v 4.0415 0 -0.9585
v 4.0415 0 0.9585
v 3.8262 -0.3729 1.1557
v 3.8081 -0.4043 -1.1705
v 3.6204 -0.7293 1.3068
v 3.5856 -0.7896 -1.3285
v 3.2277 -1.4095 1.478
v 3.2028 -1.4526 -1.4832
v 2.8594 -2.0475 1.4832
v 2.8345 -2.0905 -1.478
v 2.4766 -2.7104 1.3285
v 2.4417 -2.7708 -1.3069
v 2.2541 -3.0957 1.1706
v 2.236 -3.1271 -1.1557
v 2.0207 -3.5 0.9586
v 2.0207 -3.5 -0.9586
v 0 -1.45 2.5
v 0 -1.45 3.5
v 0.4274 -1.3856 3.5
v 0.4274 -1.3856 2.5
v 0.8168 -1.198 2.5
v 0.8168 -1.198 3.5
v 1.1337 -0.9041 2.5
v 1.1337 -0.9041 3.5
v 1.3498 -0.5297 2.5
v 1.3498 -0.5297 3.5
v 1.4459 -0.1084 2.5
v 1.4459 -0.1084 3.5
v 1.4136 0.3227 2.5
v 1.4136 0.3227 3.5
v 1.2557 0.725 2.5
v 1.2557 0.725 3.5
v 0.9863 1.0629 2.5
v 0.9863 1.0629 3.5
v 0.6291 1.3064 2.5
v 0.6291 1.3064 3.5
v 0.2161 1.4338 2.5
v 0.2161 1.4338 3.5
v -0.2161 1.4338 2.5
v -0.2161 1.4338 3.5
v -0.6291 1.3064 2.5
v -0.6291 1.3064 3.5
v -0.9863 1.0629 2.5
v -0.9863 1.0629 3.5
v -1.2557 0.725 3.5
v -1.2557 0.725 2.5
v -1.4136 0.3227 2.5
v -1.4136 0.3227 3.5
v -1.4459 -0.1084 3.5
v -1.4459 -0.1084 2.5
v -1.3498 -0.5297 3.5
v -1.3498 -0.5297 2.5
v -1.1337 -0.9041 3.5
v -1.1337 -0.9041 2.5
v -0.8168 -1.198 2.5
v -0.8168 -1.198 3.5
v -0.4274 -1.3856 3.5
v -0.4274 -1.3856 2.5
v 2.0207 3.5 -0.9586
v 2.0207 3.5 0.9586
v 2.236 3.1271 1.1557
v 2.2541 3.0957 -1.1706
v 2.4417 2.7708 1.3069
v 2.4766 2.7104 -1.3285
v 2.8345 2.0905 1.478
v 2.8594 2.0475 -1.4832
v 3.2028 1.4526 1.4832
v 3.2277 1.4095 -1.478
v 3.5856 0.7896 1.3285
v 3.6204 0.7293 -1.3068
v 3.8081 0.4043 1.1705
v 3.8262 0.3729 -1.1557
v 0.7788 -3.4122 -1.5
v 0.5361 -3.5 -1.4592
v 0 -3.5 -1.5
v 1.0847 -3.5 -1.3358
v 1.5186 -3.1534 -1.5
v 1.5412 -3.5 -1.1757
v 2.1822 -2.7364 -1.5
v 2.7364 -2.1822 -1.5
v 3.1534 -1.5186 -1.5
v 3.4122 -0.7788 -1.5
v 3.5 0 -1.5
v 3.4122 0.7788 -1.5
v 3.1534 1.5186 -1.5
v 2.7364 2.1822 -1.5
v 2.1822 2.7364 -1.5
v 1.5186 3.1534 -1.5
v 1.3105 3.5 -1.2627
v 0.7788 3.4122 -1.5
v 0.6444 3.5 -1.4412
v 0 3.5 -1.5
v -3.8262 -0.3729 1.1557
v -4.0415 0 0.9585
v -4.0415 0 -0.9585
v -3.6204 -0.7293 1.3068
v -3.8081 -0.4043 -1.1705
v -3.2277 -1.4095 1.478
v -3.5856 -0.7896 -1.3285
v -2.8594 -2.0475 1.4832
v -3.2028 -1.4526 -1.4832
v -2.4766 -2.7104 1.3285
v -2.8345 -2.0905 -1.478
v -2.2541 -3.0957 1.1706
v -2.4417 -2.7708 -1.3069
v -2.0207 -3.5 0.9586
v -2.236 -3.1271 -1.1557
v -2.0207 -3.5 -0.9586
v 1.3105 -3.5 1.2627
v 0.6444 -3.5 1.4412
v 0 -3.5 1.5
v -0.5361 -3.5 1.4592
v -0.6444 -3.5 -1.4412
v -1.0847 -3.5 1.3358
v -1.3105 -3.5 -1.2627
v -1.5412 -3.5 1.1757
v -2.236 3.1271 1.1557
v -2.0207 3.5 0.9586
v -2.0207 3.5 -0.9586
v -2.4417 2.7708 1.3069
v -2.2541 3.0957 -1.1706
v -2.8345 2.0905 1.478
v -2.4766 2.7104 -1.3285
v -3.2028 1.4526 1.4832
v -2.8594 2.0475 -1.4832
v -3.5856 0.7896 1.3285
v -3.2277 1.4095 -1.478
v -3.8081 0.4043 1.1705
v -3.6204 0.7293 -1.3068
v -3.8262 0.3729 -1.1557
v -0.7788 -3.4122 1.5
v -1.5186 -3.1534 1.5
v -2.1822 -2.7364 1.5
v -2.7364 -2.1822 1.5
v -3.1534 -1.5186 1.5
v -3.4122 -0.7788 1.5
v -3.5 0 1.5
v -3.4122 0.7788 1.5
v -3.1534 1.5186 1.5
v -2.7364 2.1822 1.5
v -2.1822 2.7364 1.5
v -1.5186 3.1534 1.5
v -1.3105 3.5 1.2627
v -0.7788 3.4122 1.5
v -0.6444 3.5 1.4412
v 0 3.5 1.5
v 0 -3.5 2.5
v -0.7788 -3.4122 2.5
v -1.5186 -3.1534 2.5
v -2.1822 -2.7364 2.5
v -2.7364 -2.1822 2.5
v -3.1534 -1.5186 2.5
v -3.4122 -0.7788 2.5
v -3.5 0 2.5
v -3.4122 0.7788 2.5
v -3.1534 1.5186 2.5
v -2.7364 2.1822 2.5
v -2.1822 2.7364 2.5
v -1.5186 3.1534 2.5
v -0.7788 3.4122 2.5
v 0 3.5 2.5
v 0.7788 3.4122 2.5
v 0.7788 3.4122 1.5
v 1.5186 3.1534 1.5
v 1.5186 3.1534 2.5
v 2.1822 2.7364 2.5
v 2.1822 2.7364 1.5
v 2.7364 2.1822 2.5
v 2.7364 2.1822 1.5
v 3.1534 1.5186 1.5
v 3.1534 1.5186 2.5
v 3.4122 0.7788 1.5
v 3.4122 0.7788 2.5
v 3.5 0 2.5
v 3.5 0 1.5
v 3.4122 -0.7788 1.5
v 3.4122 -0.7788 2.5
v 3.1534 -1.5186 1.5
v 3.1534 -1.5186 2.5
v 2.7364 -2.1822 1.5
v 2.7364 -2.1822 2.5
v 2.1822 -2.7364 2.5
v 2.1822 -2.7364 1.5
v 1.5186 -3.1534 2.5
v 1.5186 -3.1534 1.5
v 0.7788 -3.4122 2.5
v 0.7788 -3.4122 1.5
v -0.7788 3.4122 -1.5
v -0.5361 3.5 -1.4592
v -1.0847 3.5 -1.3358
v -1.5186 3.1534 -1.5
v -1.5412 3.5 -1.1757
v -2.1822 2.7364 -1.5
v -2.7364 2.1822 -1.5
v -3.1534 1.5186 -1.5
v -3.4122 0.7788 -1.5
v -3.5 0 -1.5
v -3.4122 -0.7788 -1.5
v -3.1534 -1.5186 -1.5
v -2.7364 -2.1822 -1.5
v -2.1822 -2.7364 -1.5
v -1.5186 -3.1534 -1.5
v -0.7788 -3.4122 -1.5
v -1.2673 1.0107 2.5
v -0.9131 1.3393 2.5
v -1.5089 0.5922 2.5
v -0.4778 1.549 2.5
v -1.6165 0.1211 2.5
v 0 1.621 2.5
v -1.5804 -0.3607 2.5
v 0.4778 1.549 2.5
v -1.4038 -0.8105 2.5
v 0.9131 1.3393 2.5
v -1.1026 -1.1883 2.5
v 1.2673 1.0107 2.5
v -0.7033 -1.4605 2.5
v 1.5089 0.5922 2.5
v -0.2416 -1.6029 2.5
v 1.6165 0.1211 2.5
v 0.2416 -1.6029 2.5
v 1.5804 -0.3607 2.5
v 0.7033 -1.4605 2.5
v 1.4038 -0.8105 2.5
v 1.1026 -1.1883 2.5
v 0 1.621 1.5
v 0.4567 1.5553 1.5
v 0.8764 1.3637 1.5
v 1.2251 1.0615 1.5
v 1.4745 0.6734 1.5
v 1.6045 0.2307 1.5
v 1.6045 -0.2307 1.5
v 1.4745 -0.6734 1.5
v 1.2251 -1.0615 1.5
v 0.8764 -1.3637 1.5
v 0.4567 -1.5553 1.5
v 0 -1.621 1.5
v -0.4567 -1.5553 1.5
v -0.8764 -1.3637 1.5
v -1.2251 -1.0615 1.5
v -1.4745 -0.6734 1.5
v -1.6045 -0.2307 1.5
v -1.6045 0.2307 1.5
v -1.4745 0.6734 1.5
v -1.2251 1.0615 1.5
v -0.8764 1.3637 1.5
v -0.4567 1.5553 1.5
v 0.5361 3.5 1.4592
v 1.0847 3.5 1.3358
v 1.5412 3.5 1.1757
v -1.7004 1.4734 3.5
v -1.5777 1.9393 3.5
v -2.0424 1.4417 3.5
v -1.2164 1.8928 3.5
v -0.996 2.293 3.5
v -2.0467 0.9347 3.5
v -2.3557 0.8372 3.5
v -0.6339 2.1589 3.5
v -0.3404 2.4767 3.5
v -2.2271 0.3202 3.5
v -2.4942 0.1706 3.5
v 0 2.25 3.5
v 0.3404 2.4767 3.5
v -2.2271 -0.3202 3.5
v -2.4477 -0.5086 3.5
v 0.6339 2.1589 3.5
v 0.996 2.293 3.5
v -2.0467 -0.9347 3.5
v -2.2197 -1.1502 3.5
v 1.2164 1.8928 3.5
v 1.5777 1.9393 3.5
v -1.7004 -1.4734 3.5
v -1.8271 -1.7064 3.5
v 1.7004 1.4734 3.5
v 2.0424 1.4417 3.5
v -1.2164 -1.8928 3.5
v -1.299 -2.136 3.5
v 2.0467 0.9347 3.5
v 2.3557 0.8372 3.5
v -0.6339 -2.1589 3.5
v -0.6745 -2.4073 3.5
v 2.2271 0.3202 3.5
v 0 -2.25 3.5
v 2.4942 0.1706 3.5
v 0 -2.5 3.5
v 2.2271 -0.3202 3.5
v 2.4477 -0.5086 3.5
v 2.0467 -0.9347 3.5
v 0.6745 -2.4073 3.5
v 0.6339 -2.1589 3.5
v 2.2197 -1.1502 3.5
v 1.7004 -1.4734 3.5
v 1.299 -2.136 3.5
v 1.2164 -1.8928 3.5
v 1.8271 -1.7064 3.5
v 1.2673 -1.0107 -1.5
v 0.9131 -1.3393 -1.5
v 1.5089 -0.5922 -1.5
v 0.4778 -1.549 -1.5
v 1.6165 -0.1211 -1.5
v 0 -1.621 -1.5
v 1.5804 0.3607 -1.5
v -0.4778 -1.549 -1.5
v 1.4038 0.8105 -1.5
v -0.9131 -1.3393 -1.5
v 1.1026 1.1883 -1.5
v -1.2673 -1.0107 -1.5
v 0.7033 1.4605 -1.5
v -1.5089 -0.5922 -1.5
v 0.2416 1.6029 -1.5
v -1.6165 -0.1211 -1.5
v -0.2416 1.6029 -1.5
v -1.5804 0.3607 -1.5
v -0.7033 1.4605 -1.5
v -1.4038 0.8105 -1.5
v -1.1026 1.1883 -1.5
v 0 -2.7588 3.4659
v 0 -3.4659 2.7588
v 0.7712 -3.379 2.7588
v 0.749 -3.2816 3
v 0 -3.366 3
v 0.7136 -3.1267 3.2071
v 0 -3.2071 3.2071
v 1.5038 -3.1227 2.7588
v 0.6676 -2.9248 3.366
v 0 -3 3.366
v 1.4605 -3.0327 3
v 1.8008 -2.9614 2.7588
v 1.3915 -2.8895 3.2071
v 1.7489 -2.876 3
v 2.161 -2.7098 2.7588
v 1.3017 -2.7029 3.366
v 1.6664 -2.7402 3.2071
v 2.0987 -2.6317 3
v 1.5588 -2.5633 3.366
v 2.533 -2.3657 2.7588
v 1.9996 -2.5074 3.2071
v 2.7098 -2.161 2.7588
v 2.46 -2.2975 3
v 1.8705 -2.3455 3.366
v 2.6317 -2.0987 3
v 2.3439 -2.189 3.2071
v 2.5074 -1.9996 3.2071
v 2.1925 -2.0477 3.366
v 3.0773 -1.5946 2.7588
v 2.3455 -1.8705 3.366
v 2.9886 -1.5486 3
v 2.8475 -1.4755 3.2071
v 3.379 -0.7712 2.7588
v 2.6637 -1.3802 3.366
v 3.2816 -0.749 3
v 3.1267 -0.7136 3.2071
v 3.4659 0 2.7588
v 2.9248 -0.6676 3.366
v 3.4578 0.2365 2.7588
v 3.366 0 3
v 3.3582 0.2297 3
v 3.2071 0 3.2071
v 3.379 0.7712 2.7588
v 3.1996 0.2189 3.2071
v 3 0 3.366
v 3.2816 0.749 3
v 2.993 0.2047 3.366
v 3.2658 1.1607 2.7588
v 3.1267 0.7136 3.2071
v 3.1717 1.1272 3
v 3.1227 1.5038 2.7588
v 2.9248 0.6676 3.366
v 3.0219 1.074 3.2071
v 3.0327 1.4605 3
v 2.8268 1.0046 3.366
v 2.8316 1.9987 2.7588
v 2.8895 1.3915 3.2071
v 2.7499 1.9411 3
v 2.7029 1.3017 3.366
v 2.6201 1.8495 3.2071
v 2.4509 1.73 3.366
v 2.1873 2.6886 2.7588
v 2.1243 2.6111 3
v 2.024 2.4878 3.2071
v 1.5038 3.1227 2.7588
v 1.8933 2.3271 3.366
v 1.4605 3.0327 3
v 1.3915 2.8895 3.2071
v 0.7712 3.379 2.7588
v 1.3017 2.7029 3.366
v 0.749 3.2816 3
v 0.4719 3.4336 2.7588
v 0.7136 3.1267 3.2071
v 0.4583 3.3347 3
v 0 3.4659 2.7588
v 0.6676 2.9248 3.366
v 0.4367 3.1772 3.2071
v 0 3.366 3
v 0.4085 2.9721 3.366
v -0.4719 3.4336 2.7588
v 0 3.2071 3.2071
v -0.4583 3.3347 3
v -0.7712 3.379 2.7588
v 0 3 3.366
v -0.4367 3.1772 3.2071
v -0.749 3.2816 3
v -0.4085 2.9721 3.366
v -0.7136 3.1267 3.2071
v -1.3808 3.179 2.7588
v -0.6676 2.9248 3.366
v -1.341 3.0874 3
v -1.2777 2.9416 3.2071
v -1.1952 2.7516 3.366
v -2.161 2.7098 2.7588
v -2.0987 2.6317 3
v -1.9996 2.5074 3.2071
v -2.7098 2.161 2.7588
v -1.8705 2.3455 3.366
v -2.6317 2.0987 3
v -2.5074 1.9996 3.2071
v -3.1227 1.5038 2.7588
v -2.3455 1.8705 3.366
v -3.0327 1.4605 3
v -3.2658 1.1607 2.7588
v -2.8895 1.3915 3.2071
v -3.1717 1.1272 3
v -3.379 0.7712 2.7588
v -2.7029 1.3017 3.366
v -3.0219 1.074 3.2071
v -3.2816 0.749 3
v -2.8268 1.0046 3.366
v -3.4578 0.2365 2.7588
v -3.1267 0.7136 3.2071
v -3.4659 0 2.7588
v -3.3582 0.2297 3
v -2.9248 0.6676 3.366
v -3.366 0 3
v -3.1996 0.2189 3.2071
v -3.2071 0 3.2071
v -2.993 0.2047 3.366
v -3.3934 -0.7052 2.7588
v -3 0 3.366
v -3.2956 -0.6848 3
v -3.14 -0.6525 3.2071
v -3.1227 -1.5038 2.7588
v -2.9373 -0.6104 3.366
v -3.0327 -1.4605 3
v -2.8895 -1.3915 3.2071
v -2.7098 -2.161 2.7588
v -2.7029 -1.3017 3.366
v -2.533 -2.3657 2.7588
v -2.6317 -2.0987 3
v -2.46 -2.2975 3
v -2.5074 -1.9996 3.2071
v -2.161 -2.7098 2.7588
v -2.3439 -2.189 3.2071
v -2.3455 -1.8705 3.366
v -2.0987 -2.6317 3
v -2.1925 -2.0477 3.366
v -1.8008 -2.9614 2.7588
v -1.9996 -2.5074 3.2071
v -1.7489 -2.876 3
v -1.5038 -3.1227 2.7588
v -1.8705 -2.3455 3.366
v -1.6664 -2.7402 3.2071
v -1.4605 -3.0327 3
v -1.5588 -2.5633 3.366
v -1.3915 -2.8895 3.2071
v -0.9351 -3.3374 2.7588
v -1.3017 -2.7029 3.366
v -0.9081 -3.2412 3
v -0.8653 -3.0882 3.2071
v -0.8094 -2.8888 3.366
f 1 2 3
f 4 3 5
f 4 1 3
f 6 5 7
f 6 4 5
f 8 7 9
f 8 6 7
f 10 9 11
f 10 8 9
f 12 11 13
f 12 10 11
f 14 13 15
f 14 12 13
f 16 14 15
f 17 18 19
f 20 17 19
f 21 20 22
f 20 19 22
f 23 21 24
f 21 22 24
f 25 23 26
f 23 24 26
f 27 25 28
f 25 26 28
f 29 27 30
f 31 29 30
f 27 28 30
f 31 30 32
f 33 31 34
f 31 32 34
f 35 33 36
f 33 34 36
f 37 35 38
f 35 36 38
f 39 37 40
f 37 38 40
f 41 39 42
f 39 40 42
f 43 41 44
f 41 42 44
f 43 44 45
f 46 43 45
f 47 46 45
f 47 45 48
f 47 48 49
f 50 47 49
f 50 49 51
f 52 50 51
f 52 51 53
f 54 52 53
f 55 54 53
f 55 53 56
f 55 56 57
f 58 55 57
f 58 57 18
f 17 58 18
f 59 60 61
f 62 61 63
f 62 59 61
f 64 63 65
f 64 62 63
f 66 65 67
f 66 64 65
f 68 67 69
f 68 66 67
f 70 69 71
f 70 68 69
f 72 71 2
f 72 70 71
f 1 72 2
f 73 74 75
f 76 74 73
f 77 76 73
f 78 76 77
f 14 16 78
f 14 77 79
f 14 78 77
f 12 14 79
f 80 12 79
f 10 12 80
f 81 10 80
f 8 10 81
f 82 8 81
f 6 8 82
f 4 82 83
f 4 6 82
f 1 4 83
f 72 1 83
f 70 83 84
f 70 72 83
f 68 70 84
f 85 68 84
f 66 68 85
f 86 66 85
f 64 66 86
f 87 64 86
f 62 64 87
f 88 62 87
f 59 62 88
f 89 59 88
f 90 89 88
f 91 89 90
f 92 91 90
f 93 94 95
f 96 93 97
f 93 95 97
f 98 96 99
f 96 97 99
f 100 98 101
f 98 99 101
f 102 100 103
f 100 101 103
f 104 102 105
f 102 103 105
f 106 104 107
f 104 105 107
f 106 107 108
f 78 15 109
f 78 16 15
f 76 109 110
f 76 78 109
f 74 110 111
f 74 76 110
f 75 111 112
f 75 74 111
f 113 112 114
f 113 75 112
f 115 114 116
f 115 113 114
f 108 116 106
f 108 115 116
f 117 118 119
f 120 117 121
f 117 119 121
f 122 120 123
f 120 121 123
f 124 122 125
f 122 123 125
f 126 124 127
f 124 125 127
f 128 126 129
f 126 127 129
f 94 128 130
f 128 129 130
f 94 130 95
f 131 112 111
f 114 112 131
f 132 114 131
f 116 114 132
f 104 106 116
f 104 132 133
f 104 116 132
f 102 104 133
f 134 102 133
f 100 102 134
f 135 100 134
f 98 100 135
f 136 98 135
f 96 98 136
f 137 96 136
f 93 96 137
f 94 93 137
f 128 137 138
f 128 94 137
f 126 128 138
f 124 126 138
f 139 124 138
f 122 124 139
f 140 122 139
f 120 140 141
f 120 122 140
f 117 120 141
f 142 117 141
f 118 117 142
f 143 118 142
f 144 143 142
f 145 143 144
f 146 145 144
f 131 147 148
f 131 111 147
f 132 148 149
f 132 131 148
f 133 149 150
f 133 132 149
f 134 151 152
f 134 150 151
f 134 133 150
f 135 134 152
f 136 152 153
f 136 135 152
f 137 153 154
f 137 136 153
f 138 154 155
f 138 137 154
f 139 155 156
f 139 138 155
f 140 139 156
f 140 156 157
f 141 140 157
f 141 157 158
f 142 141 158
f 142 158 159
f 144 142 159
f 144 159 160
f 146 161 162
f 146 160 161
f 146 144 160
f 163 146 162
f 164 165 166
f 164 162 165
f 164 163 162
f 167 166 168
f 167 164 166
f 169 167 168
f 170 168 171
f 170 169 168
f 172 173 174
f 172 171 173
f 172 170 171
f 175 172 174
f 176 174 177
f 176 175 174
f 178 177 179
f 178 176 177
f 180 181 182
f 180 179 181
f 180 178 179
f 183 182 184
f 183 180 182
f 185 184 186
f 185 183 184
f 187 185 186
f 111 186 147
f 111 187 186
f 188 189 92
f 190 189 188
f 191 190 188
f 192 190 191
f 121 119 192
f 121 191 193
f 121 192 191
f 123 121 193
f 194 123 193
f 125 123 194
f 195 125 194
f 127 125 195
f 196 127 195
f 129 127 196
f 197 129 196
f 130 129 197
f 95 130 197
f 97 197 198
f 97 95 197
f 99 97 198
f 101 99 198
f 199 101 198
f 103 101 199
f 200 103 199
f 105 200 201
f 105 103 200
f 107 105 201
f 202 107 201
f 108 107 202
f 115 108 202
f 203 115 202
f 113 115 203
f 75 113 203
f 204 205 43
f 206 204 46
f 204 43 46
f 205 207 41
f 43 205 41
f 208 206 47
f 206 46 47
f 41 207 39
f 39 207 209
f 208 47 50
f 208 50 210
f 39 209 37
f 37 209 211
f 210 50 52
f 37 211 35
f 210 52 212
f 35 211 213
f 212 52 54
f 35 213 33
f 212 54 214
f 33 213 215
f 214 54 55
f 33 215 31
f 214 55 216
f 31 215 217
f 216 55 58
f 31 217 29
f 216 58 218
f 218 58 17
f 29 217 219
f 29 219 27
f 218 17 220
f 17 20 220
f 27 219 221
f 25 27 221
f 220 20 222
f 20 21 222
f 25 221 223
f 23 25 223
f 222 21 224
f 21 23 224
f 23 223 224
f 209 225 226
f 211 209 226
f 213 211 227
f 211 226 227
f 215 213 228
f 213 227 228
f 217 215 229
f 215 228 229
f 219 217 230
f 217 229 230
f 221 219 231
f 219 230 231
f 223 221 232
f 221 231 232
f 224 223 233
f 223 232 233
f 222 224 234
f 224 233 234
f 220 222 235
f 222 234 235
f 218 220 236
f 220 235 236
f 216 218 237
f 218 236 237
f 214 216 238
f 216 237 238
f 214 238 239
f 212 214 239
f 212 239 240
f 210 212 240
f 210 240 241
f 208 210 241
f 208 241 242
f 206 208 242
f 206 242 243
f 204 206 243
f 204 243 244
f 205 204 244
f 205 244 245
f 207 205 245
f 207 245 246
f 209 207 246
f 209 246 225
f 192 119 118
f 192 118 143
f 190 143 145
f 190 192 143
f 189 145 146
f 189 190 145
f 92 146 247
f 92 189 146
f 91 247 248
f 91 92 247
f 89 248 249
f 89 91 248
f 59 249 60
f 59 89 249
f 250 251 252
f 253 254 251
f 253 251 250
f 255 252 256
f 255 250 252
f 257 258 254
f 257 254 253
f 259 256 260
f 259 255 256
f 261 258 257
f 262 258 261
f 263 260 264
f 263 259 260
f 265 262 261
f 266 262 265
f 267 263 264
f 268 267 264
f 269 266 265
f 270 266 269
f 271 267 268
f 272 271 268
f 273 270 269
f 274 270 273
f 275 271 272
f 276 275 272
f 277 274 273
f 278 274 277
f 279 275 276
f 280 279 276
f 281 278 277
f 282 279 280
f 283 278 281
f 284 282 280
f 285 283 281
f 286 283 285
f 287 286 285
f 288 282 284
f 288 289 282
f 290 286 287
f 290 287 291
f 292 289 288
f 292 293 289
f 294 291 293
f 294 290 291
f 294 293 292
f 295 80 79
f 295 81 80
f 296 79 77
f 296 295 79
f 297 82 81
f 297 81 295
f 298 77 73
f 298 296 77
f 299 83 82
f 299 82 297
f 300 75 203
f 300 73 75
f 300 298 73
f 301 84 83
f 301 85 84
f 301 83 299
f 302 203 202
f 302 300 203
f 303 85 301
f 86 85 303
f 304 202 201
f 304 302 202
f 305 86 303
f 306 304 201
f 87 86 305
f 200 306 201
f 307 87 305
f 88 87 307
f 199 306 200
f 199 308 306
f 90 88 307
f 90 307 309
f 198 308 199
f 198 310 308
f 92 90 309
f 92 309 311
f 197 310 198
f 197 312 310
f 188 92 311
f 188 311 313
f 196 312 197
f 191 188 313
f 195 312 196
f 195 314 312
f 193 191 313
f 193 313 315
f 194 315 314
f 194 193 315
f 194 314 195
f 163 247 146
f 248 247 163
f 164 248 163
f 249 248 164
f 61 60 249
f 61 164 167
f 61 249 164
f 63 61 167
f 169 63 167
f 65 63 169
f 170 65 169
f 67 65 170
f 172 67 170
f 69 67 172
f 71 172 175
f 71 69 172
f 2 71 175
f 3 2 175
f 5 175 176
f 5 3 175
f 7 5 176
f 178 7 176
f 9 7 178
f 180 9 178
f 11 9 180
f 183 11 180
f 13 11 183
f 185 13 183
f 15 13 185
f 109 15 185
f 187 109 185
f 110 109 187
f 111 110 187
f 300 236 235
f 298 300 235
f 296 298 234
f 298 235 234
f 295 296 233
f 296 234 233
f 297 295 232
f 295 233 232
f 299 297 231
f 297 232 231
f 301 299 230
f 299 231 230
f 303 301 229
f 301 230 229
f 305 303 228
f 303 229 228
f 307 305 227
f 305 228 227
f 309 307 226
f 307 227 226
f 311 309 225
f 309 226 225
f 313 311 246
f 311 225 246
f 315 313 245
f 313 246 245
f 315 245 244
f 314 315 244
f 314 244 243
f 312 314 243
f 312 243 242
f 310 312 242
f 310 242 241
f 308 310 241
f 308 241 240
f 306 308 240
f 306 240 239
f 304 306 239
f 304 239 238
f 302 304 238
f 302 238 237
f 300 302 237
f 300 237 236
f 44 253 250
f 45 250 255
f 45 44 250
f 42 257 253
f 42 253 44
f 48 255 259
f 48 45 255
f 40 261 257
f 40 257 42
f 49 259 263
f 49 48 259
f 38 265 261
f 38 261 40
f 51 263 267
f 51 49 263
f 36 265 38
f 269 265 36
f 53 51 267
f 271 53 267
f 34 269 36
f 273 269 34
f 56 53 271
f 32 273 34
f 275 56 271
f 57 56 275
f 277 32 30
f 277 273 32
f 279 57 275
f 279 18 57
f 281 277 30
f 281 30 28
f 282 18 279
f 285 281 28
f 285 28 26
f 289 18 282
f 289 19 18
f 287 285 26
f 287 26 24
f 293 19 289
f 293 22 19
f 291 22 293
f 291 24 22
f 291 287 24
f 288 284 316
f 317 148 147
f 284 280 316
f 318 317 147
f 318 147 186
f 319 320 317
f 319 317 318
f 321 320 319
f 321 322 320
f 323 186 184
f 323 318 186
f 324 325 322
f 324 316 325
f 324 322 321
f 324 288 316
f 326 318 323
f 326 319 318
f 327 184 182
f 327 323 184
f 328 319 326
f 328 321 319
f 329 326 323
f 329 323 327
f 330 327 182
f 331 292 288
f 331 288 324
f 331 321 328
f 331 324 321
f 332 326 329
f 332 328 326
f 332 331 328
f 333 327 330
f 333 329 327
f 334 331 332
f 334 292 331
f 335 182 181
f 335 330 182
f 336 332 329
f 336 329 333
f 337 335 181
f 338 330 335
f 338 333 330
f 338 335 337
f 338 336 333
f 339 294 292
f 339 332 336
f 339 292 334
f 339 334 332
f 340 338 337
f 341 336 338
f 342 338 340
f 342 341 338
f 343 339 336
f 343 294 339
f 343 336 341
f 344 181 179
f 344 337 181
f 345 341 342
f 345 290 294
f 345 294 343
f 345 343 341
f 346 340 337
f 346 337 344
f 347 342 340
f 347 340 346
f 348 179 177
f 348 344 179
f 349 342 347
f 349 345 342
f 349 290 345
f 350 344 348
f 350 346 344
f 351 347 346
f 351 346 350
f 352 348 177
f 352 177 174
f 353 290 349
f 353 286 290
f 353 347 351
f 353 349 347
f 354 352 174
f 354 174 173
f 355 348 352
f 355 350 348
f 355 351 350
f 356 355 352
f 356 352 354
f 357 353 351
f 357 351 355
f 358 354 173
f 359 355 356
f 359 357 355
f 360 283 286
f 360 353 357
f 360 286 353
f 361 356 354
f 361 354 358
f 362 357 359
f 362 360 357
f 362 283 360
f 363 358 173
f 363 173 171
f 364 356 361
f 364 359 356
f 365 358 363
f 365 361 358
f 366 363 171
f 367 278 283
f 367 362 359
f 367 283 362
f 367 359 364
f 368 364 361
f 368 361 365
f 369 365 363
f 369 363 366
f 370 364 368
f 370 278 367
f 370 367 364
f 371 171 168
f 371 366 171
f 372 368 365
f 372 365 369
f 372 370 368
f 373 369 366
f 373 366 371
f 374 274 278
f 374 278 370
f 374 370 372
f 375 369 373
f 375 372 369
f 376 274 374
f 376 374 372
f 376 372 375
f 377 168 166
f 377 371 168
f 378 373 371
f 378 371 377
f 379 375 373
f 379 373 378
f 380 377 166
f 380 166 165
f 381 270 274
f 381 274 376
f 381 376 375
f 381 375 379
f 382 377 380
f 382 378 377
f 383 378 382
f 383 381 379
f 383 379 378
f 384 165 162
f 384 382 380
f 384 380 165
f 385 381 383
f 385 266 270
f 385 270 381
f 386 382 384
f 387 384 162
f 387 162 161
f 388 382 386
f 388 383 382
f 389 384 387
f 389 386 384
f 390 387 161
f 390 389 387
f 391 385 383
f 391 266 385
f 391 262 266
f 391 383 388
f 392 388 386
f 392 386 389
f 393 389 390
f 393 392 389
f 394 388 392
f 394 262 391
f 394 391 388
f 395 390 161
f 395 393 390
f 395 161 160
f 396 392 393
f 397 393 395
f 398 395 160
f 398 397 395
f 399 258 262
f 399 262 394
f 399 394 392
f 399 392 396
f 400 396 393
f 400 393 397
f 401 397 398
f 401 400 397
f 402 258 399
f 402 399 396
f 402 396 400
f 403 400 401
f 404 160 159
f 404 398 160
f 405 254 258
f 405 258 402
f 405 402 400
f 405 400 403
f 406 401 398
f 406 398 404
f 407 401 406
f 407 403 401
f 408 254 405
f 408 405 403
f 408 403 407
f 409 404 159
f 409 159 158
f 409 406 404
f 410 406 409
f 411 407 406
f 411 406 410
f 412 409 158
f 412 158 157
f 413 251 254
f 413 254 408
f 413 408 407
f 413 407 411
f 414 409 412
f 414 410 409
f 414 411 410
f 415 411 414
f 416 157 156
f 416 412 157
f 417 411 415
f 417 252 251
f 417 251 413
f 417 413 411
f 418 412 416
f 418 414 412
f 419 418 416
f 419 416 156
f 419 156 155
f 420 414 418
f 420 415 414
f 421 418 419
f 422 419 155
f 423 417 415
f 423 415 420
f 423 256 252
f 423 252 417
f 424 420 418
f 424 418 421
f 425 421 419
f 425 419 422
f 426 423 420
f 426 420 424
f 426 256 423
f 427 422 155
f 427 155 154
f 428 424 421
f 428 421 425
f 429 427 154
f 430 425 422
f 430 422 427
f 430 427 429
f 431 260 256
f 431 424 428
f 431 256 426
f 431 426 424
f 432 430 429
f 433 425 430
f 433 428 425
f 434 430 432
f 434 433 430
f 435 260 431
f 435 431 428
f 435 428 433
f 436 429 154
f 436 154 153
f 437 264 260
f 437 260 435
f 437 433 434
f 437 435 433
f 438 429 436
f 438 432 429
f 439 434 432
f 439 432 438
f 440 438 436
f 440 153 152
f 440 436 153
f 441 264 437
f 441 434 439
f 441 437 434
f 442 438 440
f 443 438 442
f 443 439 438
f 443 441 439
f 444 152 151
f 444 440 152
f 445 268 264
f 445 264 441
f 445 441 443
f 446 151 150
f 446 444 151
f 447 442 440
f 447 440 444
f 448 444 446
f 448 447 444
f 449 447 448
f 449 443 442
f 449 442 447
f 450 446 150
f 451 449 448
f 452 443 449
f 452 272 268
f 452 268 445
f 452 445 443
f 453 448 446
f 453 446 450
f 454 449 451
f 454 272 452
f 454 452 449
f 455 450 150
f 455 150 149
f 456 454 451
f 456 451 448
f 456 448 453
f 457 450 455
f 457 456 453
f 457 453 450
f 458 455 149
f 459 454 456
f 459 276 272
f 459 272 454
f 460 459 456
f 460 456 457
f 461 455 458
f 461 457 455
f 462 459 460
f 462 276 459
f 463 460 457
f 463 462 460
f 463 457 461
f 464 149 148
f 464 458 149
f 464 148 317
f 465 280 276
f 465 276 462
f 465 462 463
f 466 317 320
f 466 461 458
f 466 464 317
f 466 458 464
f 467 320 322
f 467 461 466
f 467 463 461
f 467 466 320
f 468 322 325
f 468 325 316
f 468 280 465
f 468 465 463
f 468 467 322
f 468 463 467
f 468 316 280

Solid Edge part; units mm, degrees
sketch "Sketch1" plane through (0, 0, 0) normal (0, 0, 1) x (1, 0, 0)
  line L0 (2.0207, -3.5) -> (-2.0207, -3.5)
  line L1 (-4.0415, 0) -> (-2.0207, -3.5)
  line L2 (-2.0207, 3.5) -> (-4.0415, 0)
  line L3 (-2.0207, 3.5) -> (2.0207, 3.5)
  line L4 (2.0207, 3.5) -> (4.0415, 0)
  line L5 (4.0415, 0) -> (2.0207, -3.5)
extrude "Protrusion1" add sketch "Sketch1" along normal mid plane 3
sketch "Sketch2" plane through (0, 0, 0) normal (1, 0, 0) x (0, 1, 0)
  line L0 (-3.5, 1.5) -> (-1.7635, 3.2365)
revolve "RevolvedCutout1" cut sketch "Sketch2" angle 360 about axis through (0, 0, -57) along (0, 0, 1) material side at (0, -2.6671, 2.4036)
mirror "Mirror1" about plane through (0, 0, 0) normal (0, 0, 1) of "RevolvedCutout1"
sketch "Sketch3" plane through (0, 0, 0) normal (1, 0, 0) x (0, 1, 0)
  line L0 (0, 1.5) -> (0, 3.5)
  line L1 (0, 3.5) -> (-2.5, 3.5)
  arc A0 (-3.5, 2.5) -> (-2.5, 3.5) centre (-2.5, 2.5) cw
  line L2 (-3.5, 2.5) -> (-3.5, 1.5)
  line L3 (-3.5, 1.5) -> (0, 1.5)
  dimension "D1" = 2
revolve "RevolvedProtrusion1" add sketch "Sketch3" angle 360 about axis through (0, 0, -57) along (0, 0, 1)
hole "Hole_1" at (0, 0, 1.5) direction (0, 0, 1) diameter 3.242 end through all both ways yes
sketch "Sketch4" plane through (0, 0, 3.5) normal (0, 0, 1) x (0, 1, 0)
  circle A0 centre (0, 0) radius 2.25
extrude "ExtrudedCutout_1" cut sketch "Sketch4" against normal blind 1
sketch "Sketch5" plane through (0, 0, 0) normal (1, 0, 0) x (0, 1, 0)
  line L0 (-2.25, 2.5) -> (-1.45, 2.5)
  line L1 (-1.45, 2.5) -> (-1.45, 3.5)
  line L2 (-1.45, 3.5) -> (-2.25, 3.5)
  line L3 (-2.25, 3.5) -> (-2.25, 2.5)
revolve "RevolvedProtrusion2" add sketch "Sketch5" angle 360 about axis through (0, 0, -57) along (0, 0, 1)
